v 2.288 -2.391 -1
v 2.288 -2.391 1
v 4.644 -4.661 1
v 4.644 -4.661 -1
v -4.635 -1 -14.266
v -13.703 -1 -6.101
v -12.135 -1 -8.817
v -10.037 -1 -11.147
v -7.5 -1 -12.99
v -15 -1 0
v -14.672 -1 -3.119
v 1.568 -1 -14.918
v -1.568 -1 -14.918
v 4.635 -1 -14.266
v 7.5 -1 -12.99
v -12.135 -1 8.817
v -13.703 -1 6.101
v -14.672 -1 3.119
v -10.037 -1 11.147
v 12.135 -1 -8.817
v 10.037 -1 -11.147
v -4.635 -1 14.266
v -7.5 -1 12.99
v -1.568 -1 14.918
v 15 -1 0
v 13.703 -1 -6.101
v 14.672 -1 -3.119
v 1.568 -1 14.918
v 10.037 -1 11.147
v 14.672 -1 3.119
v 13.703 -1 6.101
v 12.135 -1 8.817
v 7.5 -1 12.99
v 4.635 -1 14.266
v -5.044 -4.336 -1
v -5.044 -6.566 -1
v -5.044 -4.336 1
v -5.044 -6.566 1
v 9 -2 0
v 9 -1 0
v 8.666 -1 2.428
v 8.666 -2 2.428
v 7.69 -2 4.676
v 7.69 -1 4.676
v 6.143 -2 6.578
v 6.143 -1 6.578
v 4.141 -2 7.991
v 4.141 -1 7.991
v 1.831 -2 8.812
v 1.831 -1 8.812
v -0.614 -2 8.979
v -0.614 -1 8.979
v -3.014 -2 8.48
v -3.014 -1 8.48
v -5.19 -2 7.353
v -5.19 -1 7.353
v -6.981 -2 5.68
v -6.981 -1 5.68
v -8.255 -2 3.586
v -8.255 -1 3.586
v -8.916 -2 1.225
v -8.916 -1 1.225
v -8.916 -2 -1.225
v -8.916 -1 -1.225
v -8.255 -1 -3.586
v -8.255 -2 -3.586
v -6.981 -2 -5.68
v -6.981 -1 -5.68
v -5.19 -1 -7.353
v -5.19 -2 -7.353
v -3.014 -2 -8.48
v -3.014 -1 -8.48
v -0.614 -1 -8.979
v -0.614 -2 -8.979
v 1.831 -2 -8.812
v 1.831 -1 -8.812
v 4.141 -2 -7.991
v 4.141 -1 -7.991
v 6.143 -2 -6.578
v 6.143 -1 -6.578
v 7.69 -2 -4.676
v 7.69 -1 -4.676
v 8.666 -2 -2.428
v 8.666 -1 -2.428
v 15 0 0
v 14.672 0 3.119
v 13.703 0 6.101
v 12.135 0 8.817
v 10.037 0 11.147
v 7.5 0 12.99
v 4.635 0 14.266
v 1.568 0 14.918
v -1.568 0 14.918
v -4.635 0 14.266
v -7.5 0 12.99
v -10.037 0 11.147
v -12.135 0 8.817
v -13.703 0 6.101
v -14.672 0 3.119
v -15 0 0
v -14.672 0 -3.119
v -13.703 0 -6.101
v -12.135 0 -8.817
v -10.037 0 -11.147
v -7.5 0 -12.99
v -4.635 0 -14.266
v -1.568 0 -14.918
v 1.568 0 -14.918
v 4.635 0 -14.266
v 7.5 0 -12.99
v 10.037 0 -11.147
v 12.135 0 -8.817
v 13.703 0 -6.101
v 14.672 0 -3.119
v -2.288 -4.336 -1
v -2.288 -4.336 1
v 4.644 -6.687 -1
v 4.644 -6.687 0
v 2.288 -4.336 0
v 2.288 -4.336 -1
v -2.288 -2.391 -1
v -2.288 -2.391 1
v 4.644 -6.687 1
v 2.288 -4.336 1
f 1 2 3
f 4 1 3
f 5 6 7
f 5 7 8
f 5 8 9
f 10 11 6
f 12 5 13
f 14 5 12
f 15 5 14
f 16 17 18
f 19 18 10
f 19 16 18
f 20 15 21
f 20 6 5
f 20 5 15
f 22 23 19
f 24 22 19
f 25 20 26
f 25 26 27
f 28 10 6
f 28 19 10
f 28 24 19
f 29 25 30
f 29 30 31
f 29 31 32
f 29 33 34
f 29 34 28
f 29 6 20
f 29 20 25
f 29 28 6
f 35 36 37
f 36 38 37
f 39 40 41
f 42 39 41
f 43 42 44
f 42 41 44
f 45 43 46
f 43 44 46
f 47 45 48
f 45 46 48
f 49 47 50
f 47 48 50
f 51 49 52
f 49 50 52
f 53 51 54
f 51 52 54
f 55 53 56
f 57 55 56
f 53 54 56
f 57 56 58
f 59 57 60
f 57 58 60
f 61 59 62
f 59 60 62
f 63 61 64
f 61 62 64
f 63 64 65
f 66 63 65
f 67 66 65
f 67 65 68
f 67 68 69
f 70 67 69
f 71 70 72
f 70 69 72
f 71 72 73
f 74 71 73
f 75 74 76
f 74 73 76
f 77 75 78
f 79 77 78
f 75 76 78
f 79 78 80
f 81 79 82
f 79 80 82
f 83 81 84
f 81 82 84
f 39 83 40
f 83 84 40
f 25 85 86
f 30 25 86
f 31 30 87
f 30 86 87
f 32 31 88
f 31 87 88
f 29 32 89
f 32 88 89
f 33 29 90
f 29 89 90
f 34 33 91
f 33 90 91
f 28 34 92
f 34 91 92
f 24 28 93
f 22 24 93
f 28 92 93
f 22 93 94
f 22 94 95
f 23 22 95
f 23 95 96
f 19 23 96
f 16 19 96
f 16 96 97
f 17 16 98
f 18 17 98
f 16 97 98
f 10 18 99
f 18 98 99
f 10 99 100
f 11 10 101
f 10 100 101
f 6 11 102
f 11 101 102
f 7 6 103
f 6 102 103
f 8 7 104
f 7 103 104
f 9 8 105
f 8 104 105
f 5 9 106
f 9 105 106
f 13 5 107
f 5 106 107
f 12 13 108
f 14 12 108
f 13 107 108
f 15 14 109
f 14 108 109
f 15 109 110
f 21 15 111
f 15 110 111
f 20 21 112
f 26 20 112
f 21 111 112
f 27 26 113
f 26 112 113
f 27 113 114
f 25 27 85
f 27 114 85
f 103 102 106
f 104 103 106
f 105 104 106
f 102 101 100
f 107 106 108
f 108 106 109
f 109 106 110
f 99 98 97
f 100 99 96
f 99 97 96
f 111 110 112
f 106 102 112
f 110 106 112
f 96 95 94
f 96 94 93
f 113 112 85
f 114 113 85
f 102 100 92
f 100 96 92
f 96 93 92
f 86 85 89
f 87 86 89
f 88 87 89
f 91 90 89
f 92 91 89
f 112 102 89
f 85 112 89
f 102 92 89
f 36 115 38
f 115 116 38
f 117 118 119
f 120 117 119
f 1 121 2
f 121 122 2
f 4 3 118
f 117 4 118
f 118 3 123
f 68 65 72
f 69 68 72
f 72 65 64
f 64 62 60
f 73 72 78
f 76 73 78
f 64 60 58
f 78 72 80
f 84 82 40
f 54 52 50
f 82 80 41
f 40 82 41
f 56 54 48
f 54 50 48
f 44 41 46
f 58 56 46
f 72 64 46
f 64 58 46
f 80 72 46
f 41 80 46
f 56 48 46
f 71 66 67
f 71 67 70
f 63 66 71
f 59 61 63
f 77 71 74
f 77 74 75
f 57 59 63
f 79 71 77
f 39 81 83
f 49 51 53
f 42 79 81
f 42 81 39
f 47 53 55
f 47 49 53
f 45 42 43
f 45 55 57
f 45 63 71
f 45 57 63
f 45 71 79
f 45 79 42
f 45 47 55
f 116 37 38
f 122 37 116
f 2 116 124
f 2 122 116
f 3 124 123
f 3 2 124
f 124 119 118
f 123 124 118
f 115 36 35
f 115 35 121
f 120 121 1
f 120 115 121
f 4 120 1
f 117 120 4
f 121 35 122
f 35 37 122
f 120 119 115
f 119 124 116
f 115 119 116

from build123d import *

# Parameters (mm, degrees)
F0_R     = 15
F1_DEPTH = 1
F2_R     = 9
F3_DEPTH = 1
F4_W     = 4.575278
F4_H     = 1.945662
F5_DEPTH = 1
F6_DEPTH = 1


with BuildPart() as f1:
    # F0 (on Front) → F1 (new body)
    with BuildSketch(Plane.XZ):
        Circle(F0_R)
    extrude(amount=F1_DEPTH)


with BuildPart() as f3:
    # F2 (on face) → F3 (new body)
    with BuildSketch(Plane.XZ.offset(1)):
        Circle(F2_R)
    extrude(amount=F3_DEPTH)


with BuildPart() as f5:
    # F4 (on Top) → F5 (new body)
    with BuildSketch(Plane.XY):
        Polygon((2.287639, -2.390692), (2.287639, -4.336354), (4.64378, -6.687361), (4.64378, -4.660631), align=None)
        with Locations((0, -3.363523)):
            Rectangle(F4_W, F4_H)
        Polygon((-5.043993, -6.565758), (-2.287639, -4.336354), (-2.287639, -2.390692), (-5.043993, -4.336354), align=None)
    extrude(amount=F5_DEPTH)

    # F5_face (on face) → F6 (join)
    with BuildSketch(Plane(origin=(-0.259442, -3.962668, 0), x_dir=(1, 0, 0), z_dir=(0, 0, -1))):
        Polygon((4.903222, 2.724694), (2.547081, 0.373686), (-2.028197, 0.373686), (-4.784551, 2.60309), (-4.784551, 0.373686), (-2.028197, -1.571976), (2.547081, -1.571976), (4.903222, 0.697963), align=None)
    extrude(amount=F6_DEPTH)


solid = Compound([f1.part, f3.part, f5.part])
